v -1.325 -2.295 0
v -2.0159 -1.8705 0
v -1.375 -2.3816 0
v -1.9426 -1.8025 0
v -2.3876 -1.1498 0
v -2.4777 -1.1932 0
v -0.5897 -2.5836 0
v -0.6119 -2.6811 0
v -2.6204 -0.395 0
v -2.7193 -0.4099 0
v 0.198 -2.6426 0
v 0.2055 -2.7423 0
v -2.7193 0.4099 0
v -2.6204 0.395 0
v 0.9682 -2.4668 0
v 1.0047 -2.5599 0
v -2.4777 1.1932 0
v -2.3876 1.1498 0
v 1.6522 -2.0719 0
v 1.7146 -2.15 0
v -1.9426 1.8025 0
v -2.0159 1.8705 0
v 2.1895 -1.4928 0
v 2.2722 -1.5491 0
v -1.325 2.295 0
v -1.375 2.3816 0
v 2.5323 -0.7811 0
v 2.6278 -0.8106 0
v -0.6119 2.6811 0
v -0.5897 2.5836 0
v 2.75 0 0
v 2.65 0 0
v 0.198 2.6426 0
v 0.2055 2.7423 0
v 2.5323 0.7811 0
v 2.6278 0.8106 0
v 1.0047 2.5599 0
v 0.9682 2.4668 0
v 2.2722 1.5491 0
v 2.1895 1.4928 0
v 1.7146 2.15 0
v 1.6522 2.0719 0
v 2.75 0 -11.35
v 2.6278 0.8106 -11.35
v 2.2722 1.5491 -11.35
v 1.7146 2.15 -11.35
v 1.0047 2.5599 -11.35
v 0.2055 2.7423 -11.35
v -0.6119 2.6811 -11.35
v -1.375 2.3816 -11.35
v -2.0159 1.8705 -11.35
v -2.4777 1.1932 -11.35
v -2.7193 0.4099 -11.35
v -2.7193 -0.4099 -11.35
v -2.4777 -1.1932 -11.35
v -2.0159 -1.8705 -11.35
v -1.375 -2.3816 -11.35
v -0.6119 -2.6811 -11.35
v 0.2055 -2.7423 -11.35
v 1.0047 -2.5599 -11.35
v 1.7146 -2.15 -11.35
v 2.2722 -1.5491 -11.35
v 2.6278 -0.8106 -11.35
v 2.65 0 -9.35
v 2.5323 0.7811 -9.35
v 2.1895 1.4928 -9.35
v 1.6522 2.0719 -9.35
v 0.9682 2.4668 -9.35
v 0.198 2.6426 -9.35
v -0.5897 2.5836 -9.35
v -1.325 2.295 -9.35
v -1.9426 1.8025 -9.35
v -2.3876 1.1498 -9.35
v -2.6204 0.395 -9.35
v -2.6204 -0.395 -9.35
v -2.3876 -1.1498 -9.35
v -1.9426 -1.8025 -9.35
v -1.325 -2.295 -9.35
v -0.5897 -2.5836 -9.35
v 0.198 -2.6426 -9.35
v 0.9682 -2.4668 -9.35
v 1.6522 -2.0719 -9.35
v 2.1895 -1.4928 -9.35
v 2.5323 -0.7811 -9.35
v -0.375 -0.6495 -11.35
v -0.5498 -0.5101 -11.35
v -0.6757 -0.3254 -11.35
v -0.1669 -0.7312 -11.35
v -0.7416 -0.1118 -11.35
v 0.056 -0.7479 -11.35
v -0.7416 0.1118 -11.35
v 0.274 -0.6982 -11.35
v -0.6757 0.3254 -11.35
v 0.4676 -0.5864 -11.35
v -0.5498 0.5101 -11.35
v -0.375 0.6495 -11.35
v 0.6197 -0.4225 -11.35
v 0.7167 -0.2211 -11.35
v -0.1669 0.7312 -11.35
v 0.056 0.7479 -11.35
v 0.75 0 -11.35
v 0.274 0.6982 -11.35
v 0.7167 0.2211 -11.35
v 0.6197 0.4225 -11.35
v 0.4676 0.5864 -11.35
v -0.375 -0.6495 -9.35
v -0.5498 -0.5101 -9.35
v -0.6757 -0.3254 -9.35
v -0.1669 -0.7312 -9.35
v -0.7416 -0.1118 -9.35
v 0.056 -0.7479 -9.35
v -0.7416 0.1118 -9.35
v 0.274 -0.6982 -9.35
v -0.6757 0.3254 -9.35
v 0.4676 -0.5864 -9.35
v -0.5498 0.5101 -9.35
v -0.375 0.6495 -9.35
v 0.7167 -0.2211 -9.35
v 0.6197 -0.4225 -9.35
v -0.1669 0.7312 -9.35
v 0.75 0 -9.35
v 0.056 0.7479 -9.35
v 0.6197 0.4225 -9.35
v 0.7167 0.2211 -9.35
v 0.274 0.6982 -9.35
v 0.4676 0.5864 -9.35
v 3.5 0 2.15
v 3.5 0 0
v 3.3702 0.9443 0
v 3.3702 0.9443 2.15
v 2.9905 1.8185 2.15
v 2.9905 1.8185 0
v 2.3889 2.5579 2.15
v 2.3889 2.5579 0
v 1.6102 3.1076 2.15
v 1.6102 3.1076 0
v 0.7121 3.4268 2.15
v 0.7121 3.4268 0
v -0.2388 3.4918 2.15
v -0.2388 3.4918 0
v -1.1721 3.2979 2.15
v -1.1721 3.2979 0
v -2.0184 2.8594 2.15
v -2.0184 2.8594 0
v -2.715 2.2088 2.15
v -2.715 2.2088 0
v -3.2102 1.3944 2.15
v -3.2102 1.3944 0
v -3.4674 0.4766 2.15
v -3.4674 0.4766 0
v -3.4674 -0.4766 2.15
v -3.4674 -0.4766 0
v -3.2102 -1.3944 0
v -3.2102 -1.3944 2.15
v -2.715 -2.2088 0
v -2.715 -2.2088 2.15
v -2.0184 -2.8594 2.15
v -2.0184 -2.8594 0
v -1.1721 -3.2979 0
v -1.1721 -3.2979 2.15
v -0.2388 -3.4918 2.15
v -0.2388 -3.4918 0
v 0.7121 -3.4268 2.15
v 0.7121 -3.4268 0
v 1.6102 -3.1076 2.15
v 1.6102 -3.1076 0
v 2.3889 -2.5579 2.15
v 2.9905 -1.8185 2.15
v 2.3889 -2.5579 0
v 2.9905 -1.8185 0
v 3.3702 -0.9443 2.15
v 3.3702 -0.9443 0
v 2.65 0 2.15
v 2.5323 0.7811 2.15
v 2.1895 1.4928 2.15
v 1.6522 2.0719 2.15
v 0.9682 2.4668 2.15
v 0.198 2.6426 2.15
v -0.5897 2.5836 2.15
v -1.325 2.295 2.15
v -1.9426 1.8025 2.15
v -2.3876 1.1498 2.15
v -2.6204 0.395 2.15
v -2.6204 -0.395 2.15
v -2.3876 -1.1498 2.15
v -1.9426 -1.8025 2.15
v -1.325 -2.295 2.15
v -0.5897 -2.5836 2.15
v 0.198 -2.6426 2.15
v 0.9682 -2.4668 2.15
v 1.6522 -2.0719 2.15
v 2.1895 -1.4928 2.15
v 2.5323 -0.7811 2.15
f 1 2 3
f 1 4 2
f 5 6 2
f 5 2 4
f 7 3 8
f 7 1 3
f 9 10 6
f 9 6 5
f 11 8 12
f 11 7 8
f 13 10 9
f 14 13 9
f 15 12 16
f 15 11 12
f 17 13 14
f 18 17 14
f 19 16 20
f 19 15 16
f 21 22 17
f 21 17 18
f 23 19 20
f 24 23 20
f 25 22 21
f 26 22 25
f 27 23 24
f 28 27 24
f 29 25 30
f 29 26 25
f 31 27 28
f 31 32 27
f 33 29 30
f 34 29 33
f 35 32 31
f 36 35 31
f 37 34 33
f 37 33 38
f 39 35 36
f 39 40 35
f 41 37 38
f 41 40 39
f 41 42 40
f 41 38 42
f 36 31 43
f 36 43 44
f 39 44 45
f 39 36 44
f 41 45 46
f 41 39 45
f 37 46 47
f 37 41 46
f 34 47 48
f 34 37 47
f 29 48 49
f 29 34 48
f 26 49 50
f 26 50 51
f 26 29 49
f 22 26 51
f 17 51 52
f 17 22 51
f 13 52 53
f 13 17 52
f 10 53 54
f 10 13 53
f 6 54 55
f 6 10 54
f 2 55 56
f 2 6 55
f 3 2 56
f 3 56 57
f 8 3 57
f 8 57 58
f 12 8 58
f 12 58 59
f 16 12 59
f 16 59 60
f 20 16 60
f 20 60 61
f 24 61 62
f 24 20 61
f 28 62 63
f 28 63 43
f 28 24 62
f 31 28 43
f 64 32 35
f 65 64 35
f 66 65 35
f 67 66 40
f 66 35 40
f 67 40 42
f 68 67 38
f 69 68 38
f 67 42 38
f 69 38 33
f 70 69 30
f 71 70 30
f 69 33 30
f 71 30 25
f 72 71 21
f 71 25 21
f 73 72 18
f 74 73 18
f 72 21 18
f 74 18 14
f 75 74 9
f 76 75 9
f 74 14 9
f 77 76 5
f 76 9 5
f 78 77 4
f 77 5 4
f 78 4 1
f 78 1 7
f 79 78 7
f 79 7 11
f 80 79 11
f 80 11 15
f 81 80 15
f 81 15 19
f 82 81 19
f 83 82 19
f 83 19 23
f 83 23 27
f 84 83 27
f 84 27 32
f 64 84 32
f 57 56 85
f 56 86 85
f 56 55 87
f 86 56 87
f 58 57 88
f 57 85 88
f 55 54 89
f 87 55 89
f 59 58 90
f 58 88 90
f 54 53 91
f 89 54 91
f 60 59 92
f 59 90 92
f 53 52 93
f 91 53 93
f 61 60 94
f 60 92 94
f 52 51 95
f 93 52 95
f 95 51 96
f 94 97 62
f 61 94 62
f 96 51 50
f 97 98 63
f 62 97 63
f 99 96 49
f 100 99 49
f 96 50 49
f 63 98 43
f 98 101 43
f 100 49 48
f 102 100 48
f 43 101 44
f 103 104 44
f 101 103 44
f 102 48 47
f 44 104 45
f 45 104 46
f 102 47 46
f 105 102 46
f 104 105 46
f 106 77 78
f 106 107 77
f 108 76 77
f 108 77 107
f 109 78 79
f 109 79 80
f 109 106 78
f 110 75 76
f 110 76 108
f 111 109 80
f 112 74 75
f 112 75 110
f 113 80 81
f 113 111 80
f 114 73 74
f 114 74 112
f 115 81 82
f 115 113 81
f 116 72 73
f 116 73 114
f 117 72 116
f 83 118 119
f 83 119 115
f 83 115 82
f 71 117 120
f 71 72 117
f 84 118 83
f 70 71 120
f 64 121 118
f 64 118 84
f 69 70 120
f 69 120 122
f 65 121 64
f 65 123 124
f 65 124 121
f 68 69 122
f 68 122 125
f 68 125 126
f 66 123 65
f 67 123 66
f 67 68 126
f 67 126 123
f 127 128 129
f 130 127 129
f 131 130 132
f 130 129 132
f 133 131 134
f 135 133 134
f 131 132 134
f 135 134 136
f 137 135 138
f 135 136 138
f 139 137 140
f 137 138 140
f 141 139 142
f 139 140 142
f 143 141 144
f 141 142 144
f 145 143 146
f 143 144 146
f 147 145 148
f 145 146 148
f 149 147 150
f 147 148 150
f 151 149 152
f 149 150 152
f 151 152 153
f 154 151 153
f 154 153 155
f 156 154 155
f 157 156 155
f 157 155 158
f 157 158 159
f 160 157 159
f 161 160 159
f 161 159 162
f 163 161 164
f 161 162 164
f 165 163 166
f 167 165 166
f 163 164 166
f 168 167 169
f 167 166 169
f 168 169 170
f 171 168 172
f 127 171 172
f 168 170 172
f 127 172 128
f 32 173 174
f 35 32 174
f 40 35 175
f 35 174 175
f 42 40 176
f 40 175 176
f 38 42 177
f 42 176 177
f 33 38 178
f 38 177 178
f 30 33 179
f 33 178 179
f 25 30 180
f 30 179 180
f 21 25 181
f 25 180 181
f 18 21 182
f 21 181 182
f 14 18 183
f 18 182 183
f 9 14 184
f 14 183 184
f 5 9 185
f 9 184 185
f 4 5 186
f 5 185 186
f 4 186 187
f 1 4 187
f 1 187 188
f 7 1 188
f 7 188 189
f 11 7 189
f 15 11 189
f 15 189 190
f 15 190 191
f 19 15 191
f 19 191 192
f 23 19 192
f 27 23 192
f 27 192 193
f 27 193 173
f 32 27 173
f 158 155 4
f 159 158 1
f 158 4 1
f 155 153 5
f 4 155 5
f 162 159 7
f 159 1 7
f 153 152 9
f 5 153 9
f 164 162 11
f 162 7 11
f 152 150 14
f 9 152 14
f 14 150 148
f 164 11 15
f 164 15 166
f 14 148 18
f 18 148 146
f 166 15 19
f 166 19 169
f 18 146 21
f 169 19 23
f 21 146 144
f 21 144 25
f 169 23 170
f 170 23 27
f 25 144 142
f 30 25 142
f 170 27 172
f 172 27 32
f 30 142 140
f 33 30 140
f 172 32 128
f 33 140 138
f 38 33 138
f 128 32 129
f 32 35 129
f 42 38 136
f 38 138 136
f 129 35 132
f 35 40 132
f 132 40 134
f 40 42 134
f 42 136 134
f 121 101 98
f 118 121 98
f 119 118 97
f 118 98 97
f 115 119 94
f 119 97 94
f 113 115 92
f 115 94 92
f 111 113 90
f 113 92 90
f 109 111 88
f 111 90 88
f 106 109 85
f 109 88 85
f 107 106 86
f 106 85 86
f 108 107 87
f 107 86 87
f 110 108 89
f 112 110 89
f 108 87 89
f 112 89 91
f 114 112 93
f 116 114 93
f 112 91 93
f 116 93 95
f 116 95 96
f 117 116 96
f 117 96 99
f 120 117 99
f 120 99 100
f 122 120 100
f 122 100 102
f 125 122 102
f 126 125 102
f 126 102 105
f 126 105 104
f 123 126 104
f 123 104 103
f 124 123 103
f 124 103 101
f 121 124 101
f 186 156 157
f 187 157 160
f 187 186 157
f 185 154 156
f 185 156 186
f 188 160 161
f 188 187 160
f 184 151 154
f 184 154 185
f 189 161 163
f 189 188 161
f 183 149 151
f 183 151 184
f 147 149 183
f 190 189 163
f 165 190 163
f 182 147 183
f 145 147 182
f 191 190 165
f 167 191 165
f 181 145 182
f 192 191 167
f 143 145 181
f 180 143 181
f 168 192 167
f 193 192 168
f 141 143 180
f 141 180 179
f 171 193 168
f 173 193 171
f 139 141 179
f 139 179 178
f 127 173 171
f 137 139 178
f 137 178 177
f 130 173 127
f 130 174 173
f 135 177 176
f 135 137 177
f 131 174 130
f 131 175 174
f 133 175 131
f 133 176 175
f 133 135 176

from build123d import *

# Parameters (mm, degrees)
F0_R     = 2.75
F1_DEPTH = 11.35
F2_R     = 3.5
F3_DEPTH = 2.15
F4_R     = 2.65
F5_DEPTH = 11.5
F6_R     = 0.75
F7_DEPTH = 13.501


with BuildPart() as f1:
    # F0 (on Top) → F1 (new body)
    with BuildSketch(Plane.XY):
        Circle(F0_R)
    extrude(amount=-F1_DEPTH)


with BuildPart() as f3:
    # F2 (on Top) → F3 (new body)
    with BuildSketch(Plane.XY):
        Circle(F2_R)
    extrude(amount=F3_DEPTH)


with BuildPart() as f5_tool:
    # F4 (on face) → F5 (new body)
    with BuildSketch(Plane.XY.offset(2.15)):
        Circle(F4_R)
    extrude(amount=-F5_DEPTH)


with BuildPart() as f1_1:
    add(f1.part)

    # F5: cut by f5_tool
    add(f5_tool.part, mode=Mode.SUBTRACT)

    # F6 (on face) → F7 (cut, through all)
    with BuildSketch(Plane(origin=(0, 0, -11.35), x_dir=(1, 0, 0), z_dir=(0, 0, -1))):
        Circle(F6_R)
    extrude(amount=-F7_DEPTH, mode=Mode.SUBTRACT)


with BuildPart() as f3_1:
    add(f3.part)

    # F5: cut by f5_tool
    add(f5_tool.part, mode=Mode.SUBTRACT)


solid = Compound([f1_1.part, f3_1.part])
